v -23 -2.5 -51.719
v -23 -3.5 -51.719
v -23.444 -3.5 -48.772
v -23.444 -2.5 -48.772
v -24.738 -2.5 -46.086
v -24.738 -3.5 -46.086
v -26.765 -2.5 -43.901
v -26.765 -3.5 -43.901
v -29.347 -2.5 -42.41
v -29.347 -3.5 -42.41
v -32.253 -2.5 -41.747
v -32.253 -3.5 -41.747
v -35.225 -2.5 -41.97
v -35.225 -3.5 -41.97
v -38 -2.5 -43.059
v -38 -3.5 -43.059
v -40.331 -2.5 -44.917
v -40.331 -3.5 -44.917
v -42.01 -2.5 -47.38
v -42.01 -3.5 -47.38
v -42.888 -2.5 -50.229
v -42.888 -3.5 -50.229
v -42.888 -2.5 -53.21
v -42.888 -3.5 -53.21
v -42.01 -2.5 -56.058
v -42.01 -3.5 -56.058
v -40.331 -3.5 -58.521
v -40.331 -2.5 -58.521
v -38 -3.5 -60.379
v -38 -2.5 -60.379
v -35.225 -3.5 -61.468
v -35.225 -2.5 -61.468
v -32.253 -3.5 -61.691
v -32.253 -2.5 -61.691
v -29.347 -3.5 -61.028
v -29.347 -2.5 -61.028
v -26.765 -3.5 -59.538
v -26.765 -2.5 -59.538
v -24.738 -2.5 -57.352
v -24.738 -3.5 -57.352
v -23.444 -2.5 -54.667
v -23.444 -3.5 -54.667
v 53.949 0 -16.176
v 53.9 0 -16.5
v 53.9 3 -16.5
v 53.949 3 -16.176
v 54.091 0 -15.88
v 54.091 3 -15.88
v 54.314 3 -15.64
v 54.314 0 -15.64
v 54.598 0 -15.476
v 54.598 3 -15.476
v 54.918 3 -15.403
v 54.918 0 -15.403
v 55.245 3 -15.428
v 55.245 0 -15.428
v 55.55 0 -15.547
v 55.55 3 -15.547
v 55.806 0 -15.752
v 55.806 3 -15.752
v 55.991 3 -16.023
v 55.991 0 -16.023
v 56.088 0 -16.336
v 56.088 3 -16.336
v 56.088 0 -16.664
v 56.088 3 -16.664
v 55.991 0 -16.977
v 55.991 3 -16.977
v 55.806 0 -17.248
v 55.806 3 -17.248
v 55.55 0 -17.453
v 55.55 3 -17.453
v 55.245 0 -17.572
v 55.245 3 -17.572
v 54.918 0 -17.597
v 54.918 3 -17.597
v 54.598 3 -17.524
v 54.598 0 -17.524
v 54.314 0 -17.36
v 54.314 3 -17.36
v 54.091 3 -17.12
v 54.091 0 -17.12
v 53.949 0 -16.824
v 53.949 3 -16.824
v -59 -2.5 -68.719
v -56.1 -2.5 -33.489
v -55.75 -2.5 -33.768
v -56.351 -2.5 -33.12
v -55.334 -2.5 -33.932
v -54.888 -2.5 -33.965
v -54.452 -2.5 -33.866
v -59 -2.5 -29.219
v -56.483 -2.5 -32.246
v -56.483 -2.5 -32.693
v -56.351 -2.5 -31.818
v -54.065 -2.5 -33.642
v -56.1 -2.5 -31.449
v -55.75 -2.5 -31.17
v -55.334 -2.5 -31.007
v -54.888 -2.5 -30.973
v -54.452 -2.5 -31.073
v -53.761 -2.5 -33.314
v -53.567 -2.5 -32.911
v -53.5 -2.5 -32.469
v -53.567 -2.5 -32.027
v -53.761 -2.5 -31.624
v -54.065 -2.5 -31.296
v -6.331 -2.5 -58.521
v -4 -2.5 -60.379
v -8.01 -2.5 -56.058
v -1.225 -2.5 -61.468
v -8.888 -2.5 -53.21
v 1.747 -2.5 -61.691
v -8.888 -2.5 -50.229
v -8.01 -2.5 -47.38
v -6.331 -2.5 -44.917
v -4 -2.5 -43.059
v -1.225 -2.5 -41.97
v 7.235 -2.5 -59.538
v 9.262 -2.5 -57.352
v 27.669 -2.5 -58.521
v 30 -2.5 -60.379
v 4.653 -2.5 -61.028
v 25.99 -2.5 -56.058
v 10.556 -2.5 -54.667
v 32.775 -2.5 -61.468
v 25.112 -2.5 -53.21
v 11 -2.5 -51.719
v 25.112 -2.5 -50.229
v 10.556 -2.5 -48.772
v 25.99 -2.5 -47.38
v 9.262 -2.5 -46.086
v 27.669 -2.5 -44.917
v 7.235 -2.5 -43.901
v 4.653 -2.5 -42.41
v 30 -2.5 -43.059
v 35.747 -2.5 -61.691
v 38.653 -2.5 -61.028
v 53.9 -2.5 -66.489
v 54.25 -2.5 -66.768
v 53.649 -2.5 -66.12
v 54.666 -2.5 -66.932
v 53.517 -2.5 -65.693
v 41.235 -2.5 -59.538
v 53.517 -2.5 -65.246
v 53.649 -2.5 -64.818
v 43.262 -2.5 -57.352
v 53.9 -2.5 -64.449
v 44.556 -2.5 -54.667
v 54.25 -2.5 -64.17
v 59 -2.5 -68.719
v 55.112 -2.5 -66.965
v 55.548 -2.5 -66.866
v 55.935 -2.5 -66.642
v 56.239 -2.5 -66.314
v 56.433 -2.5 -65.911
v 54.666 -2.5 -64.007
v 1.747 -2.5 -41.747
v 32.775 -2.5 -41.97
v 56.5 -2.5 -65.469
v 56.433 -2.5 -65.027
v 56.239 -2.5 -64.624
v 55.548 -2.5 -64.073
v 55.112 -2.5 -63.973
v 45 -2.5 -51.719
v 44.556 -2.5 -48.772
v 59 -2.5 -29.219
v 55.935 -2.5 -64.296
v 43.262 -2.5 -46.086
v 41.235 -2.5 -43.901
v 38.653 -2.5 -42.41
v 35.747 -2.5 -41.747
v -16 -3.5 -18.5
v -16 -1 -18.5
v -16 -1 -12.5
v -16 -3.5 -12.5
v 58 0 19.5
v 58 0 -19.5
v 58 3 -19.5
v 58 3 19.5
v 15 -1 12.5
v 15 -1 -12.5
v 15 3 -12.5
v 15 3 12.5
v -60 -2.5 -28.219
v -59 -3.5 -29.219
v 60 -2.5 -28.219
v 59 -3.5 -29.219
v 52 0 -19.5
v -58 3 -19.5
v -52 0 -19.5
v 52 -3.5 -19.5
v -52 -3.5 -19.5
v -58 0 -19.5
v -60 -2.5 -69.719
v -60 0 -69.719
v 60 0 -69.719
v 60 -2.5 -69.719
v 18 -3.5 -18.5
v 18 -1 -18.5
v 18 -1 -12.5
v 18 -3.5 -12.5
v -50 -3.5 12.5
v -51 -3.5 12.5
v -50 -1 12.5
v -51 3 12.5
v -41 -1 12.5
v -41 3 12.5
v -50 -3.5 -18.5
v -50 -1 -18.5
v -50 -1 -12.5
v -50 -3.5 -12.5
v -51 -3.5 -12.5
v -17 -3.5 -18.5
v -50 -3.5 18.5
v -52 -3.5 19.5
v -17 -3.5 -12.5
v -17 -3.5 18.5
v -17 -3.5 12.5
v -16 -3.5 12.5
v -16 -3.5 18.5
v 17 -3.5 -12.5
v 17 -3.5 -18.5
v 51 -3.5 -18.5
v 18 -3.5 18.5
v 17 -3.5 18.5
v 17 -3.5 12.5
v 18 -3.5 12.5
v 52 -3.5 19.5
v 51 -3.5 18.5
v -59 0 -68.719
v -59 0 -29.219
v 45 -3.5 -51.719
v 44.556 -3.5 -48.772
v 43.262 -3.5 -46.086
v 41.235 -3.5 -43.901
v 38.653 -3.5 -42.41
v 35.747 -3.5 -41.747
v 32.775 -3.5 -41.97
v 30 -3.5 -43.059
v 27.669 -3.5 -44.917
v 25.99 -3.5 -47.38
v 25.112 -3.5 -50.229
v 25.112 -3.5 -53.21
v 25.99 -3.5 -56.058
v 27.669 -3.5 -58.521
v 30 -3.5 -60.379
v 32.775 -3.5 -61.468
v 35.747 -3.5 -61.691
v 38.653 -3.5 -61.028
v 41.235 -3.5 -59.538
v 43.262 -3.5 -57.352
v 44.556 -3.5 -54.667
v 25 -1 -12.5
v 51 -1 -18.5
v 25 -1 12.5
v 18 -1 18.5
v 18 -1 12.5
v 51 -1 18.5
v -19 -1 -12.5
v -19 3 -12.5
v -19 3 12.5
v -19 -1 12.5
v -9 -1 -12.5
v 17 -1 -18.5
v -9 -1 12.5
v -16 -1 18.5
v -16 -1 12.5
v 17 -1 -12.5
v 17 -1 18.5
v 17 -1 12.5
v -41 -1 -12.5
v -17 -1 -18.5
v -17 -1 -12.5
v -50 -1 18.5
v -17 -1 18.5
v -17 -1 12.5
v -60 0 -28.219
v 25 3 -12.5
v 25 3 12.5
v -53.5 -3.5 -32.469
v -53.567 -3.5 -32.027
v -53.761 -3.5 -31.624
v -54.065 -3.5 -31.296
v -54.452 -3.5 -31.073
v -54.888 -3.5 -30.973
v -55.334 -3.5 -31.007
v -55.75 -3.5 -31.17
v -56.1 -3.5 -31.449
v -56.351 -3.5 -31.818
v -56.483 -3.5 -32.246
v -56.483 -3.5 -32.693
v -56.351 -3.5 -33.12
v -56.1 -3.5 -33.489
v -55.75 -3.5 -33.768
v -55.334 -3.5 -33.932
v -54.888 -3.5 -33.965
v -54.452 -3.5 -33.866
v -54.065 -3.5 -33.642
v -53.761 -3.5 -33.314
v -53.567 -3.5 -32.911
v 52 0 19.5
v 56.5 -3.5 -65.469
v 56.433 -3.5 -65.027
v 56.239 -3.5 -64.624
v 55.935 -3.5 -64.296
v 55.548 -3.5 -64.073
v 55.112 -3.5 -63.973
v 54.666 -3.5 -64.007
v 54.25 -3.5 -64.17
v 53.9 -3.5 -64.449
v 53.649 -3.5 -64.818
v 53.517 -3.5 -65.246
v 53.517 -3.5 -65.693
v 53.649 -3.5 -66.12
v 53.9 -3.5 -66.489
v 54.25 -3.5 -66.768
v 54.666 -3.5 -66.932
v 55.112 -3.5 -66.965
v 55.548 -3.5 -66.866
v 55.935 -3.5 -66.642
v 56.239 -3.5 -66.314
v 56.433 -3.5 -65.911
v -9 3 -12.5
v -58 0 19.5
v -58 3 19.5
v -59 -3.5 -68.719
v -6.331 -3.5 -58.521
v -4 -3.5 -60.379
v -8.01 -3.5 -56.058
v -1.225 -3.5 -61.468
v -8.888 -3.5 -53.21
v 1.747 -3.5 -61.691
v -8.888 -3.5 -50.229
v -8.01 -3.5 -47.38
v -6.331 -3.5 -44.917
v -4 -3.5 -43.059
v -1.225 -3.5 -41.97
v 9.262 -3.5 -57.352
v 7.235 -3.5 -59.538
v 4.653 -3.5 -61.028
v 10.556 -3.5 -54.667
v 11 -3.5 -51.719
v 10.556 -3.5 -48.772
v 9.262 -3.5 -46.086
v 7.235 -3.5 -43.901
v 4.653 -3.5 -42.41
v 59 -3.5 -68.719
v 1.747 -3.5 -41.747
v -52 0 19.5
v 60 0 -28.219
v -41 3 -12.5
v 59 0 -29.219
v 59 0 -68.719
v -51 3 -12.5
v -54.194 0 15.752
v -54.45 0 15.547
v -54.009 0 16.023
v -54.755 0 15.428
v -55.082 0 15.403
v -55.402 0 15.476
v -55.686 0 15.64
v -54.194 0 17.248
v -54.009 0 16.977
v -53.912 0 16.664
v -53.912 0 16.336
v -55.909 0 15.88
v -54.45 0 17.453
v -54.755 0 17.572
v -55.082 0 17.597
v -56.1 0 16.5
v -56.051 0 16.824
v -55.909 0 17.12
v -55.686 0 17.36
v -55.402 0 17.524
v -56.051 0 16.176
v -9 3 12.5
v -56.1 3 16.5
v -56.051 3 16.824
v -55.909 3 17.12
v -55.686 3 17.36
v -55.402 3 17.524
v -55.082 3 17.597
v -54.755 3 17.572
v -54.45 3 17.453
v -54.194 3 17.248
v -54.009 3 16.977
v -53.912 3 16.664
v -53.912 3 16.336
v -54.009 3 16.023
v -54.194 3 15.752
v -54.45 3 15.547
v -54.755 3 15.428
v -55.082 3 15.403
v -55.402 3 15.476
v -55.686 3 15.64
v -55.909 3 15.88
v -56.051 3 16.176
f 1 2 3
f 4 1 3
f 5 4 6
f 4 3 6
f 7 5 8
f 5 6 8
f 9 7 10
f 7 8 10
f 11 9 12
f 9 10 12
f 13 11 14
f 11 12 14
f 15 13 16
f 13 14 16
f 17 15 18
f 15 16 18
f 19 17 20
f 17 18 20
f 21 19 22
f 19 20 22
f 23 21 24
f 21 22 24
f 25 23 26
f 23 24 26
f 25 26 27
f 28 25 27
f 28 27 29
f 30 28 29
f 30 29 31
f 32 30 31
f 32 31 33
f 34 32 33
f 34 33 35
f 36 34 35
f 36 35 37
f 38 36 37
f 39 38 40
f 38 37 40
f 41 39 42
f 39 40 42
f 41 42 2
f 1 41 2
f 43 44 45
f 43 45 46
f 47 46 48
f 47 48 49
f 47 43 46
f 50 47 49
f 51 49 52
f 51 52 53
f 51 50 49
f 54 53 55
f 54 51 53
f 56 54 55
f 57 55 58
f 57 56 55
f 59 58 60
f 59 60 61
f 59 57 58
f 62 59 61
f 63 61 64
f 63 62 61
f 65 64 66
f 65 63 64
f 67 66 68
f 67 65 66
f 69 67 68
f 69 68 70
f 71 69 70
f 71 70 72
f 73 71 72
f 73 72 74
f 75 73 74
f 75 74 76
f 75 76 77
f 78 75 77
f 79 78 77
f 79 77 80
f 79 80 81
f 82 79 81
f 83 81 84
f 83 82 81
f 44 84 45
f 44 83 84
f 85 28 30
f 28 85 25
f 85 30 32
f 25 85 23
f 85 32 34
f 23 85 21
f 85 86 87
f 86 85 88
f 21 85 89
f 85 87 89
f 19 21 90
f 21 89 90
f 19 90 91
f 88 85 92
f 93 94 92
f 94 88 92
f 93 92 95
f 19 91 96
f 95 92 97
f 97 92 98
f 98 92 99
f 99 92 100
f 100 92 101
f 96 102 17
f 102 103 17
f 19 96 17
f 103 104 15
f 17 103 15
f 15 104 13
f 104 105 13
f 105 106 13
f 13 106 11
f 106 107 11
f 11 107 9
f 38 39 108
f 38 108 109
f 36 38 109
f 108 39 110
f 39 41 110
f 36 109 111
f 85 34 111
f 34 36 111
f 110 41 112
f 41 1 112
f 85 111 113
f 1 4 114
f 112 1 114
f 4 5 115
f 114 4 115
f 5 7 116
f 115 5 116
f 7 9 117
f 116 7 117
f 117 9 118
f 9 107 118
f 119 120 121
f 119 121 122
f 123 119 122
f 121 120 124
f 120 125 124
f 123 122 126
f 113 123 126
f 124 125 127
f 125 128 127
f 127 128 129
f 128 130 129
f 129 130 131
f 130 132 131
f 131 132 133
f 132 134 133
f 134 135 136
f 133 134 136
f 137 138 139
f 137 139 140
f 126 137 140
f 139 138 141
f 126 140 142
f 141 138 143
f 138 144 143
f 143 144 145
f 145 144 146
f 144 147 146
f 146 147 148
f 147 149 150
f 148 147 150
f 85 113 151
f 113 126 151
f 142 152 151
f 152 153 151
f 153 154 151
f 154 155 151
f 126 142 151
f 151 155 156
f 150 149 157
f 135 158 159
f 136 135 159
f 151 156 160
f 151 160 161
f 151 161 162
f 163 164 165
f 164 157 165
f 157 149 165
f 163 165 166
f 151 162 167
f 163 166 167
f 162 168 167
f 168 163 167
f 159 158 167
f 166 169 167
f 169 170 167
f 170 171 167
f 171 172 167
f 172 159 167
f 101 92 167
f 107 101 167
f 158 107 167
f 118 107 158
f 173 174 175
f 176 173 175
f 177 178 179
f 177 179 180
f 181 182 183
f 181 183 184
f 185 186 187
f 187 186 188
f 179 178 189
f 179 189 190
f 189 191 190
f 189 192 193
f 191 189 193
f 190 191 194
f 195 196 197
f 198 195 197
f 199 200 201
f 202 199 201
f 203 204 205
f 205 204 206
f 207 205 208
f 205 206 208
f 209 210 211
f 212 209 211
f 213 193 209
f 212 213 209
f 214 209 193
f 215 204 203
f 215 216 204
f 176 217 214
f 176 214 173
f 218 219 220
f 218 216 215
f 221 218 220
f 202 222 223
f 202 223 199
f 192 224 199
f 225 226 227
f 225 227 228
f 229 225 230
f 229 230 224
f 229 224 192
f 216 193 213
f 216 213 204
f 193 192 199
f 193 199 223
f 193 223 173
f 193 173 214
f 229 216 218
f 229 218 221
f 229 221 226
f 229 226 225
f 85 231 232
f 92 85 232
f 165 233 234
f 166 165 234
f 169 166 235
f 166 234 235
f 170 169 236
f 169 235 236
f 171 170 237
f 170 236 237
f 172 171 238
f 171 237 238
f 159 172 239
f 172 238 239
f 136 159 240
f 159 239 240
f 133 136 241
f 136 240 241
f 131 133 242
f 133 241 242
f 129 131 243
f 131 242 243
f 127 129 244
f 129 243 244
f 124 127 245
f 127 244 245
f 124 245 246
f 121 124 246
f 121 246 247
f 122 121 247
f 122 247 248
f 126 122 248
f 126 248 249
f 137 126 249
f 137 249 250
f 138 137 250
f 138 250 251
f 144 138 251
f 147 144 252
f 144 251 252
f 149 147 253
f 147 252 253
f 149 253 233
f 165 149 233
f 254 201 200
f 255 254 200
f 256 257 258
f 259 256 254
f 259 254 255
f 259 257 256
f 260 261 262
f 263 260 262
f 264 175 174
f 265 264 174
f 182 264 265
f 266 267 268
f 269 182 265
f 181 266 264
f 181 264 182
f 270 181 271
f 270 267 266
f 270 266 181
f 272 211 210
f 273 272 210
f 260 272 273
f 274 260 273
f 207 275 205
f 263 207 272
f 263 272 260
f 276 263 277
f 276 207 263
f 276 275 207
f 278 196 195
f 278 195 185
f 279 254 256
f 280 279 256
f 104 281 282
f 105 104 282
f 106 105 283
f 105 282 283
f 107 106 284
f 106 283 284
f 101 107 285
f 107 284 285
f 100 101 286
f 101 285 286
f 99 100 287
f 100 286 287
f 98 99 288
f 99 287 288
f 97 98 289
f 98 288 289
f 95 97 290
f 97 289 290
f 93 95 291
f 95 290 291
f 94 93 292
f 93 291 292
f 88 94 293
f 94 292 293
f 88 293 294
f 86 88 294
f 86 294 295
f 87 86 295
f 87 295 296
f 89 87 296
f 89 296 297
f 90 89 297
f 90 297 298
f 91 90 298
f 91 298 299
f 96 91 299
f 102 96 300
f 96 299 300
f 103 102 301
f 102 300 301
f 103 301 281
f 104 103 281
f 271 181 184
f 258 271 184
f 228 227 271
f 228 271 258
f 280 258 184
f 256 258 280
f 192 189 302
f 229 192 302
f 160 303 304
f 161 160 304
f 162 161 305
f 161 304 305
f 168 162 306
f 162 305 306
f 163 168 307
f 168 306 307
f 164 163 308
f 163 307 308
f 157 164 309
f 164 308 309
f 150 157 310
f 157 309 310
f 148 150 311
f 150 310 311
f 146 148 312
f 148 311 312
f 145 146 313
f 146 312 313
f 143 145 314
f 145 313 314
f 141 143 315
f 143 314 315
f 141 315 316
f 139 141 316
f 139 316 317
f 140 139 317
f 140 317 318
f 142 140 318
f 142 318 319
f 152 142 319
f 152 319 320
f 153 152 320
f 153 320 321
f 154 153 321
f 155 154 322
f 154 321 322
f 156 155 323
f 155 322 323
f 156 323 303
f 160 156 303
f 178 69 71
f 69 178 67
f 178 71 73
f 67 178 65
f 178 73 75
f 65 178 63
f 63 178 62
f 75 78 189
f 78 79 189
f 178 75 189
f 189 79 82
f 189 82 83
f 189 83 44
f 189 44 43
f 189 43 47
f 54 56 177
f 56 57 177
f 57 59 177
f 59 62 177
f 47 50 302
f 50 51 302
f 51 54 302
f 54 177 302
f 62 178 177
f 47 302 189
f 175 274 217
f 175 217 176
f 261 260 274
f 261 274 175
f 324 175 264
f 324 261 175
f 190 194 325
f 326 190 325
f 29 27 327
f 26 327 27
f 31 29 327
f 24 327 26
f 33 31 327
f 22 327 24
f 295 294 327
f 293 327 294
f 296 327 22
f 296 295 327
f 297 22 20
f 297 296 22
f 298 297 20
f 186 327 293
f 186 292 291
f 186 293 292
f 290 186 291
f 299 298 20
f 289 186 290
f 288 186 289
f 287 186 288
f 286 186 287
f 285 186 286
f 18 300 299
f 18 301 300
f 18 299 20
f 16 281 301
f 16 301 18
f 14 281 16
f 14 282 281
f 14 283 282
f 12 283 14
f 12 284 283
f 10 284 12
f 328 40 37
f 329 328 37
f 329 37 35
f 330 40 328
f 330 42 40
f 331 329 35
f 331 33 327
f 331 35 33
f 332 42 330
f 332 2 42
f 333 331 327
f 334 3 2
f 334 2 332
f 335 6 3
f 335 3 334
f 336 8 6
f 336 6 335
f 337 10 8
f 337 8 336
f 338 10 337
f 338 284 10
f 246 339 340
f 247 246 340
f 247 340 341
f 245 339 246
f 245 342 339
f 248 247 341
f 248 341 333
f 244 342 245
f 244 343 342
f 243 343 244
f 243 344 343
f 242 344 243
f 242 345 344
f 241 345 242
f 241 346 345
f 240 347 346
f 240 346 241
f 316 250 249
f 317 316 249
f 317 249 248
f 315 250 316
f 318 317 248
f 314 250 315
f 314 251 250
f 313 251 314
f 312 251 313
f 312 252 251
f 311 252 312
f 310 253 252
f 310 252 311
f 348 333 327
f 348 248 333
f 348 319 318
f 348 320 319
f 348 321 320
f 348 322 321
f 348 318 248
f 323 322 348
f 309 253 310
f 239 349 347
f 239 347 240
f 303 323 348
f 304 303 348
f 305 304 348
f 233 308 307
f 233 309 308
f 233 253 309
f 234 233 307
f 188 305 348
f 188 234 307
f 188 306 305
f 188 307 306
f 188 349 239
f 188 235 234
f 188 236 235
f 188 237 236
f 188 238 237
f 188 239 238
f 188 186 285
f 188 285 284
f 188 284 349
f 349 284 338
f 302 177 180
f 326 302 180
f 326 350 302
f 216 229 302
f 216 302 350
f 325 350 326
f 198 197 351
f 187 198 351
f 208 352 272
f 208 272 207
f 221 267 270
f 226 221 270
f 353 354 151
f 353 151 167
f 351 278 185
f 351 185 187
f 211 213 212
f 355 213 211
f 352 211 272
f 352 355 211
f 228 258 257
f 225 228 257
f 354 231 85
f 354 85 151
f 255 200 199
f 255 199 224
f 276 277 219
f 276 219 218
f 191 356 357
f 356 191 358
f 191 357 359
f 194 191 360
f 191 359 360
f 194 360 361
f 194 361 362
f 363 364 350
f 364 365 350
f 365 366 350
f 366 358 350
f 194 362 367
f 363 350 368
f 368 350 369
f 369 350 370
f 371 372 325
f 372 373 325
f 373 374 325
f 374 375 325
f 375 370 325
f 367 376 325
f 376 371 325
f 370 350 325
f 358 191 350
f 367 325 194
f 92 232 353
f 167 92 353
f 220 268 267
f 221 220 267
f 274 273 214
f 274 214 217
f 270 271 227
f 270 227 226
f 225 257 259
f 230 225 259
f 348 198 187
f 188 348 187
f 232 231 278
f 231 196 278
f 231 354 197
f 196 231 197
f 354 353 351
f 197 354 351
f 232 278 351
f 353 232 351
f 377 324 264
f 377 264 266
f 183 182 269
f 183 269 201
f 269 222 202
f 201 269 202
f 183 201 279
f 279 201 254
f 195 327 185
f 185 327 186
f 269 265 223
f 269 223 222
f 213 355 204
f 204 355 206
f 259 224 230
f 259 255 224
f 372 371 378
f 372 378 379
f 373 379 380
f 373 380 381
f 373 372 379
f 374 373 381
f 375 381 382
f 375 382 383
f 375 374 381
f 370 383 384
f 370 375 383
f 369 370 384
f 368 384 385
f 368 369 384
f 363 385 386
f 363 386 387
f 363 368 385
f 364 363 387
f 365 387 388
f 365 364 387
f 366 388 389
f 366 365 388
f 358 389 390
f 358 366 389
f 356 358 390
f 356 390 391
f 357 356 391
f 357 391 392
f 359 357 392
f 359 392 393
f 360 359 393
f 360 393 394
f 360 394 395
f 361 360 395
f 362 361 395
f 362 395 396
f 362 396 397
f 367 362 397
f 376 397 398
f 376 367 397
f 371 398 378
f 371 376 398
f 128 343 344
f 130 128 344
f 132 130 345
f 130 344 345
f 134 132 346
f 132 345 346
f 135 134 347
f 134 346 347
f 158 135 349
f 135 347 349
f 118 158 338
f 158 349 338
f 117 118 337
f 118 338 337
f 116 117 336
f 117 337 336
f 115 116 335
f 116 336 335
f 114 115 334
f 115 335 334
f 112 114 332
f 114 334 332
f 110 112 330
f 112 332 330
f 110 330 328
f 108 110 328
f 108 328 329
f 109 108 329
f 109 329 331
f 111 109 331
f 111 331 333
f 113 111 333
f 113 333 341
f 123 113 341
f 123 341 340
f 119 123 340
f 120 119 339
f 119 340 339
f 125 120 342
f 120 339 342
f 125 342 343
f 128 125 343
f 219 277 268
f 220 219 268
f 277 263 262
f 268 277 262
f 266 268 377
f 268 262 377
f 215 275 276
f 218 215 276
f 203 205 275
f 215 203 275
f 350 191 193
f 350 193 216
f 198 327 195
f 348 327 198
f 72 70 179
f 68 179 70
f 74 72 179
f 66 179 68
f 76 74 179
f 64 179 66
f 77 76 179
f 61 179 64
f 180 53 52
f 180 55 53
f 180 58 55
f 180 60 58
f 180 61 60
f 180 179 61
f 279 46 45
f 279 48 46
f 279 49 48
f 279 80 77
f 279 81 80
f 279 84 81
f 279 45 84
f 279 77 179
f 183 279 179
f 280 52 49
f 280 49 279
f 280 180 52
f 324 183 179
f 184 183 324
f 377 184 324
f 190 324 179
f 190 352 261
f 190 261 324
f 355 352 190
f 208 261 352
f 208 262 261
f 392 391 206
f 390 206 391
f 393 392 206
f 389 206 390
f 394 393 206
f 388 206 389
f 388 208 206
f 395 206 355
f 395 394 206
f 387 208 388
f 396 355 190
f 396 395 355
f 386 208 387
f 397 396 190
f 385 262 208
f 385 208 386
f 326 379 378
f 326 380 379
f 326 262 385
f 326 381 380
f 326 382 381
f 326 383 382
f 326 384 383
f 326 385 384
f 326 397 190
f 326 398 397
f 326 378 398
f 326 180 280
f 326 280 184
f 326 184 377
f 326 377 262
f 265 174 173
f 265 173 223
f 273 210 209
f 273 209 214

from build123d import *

# Parameters (mm, degrees)
F0_W      = 104
F0_H      = 39
F1_DEPTH  = 3.5
F2_T      = -1
F3_W      = 1
F3_H      = 37
F4_DEPTH  = 2.5
F5_W      = 116
F5_H      = 39
F5_R      = 1.1
F6_DEPTH  = 3
F7_W      = 10
F7_H      = 25
F8_DEPTH  = 5.6
F9_W      = 120
F9_H      = 41.5
F10_DEPTH = 3.5
F11_T     = -1
F12_R     = 1.5
F12_R_2   = 10
F13_DEPTH = 1
F14_SIZE  = 1


with BuildPart() as f1:
    # F0 (on Front) → F1 (new body)
    with BuildSketch(Plane.XZ):
        Rectangle(F0_W, F0_H)
    extrude(amount=F1_DEPTH)

    # F2
    f2_openings = [f1.faces().sort_by_distance(p)[0] for p in [
        (0, -3.5, 0),
    ]]
    offset(amount=F2_T, openings=f2_openings)

    # F3 (on face) → F4 (join)
    with BuildSketch(Plane.XZ.offset(1)):
        with Locations((-16.5, 0)):
            Rectangle(F3_W, F3_H)
        with Locations((17.5, 0)):
            Rectangle(F3_W, F3_H)
        with Locations((-50.5, 0)):
            Rectangle(F3_W, F3_H)
    extrude(amount=F4_DEPTH)

    # F5 (on face) → F6 (join)
    with BuildSketch(Plane(origin=(0, 0, 0), x_dir=(-1, 0, 0), z_dir=(0, 1, 0))):
        Rectangle(F5_W, F5_H)
        with Locations((-55, -16.5)):
            Circle(F5_R, mode=Mode.SUBTRACT)
        with Locations((55, 16.5)):
            Circle(F5_R, mode=Mode.SUBTRACT)
    extrude(amount=F6_DEPTH)

    # F7 (on Front) → F8 (cut, symmetric)
    with BuildSketch(Plane.XZ):
        with Locations((-46, 0)):
            Rectangle(F7_W, F7_H)
        with Locations((-14, 0)):
            Rectangle(F7_W, F7_H)
        with Locations((20, 0)):
            Rectangle(F7_W, F7_H)
    extrude(amount=F8_DEPTH, both=True, mode=Mode.SUBTRACT)


with BuildPart() as f10:
    # F9 (on Front) → F10 (new body)
    with BuildSketch(Plane.XZ):
        with Locations((0, -48.969205)):
            Rectangle(F9_W, F9_H)
    extrude(amount=F10_DEPTH)

    # F11
    f11_openings = [f10.faces().sort_by_distance(p)[0] for p in [
        (0, 0, -48.969205),
    ]]
    offset(amount=F11_T, openings=f11_openings)

    # F12 (on face) → F13 (cut)
    with BuildSketch(Plane.XZ.offset(3.5)):
        with Locations((55, -65.469205)):
            Circle(F12_R)
        with Locations((-55, -32.469205)):
            Circle(F12_R)
        with Locations((-33, -51.719205)):
            Circle(F12_R_2)
        with Locations((1, -51.719205)):
            Circle(F12_R_2)
        with Locations((35, -51.719205)):
            Circle(F12_R_2)
    extrude(amount=-F13_DEPTH, mode=Mode.SUBTRACT)

    # F14
    f14_edges = [f10.edges().sort_by_distance(p)[0] for p in [
        (0, -3.5, -28.219205),
        (-60, -3.5, -48.969205),
        (60, -3.5, -48.969205),
        (0, -3.5, -69.719205),
    ]]
    chamfer(f14_edges, length=F14_SIZE)


solid = Compound([f1.part, f10.part])
